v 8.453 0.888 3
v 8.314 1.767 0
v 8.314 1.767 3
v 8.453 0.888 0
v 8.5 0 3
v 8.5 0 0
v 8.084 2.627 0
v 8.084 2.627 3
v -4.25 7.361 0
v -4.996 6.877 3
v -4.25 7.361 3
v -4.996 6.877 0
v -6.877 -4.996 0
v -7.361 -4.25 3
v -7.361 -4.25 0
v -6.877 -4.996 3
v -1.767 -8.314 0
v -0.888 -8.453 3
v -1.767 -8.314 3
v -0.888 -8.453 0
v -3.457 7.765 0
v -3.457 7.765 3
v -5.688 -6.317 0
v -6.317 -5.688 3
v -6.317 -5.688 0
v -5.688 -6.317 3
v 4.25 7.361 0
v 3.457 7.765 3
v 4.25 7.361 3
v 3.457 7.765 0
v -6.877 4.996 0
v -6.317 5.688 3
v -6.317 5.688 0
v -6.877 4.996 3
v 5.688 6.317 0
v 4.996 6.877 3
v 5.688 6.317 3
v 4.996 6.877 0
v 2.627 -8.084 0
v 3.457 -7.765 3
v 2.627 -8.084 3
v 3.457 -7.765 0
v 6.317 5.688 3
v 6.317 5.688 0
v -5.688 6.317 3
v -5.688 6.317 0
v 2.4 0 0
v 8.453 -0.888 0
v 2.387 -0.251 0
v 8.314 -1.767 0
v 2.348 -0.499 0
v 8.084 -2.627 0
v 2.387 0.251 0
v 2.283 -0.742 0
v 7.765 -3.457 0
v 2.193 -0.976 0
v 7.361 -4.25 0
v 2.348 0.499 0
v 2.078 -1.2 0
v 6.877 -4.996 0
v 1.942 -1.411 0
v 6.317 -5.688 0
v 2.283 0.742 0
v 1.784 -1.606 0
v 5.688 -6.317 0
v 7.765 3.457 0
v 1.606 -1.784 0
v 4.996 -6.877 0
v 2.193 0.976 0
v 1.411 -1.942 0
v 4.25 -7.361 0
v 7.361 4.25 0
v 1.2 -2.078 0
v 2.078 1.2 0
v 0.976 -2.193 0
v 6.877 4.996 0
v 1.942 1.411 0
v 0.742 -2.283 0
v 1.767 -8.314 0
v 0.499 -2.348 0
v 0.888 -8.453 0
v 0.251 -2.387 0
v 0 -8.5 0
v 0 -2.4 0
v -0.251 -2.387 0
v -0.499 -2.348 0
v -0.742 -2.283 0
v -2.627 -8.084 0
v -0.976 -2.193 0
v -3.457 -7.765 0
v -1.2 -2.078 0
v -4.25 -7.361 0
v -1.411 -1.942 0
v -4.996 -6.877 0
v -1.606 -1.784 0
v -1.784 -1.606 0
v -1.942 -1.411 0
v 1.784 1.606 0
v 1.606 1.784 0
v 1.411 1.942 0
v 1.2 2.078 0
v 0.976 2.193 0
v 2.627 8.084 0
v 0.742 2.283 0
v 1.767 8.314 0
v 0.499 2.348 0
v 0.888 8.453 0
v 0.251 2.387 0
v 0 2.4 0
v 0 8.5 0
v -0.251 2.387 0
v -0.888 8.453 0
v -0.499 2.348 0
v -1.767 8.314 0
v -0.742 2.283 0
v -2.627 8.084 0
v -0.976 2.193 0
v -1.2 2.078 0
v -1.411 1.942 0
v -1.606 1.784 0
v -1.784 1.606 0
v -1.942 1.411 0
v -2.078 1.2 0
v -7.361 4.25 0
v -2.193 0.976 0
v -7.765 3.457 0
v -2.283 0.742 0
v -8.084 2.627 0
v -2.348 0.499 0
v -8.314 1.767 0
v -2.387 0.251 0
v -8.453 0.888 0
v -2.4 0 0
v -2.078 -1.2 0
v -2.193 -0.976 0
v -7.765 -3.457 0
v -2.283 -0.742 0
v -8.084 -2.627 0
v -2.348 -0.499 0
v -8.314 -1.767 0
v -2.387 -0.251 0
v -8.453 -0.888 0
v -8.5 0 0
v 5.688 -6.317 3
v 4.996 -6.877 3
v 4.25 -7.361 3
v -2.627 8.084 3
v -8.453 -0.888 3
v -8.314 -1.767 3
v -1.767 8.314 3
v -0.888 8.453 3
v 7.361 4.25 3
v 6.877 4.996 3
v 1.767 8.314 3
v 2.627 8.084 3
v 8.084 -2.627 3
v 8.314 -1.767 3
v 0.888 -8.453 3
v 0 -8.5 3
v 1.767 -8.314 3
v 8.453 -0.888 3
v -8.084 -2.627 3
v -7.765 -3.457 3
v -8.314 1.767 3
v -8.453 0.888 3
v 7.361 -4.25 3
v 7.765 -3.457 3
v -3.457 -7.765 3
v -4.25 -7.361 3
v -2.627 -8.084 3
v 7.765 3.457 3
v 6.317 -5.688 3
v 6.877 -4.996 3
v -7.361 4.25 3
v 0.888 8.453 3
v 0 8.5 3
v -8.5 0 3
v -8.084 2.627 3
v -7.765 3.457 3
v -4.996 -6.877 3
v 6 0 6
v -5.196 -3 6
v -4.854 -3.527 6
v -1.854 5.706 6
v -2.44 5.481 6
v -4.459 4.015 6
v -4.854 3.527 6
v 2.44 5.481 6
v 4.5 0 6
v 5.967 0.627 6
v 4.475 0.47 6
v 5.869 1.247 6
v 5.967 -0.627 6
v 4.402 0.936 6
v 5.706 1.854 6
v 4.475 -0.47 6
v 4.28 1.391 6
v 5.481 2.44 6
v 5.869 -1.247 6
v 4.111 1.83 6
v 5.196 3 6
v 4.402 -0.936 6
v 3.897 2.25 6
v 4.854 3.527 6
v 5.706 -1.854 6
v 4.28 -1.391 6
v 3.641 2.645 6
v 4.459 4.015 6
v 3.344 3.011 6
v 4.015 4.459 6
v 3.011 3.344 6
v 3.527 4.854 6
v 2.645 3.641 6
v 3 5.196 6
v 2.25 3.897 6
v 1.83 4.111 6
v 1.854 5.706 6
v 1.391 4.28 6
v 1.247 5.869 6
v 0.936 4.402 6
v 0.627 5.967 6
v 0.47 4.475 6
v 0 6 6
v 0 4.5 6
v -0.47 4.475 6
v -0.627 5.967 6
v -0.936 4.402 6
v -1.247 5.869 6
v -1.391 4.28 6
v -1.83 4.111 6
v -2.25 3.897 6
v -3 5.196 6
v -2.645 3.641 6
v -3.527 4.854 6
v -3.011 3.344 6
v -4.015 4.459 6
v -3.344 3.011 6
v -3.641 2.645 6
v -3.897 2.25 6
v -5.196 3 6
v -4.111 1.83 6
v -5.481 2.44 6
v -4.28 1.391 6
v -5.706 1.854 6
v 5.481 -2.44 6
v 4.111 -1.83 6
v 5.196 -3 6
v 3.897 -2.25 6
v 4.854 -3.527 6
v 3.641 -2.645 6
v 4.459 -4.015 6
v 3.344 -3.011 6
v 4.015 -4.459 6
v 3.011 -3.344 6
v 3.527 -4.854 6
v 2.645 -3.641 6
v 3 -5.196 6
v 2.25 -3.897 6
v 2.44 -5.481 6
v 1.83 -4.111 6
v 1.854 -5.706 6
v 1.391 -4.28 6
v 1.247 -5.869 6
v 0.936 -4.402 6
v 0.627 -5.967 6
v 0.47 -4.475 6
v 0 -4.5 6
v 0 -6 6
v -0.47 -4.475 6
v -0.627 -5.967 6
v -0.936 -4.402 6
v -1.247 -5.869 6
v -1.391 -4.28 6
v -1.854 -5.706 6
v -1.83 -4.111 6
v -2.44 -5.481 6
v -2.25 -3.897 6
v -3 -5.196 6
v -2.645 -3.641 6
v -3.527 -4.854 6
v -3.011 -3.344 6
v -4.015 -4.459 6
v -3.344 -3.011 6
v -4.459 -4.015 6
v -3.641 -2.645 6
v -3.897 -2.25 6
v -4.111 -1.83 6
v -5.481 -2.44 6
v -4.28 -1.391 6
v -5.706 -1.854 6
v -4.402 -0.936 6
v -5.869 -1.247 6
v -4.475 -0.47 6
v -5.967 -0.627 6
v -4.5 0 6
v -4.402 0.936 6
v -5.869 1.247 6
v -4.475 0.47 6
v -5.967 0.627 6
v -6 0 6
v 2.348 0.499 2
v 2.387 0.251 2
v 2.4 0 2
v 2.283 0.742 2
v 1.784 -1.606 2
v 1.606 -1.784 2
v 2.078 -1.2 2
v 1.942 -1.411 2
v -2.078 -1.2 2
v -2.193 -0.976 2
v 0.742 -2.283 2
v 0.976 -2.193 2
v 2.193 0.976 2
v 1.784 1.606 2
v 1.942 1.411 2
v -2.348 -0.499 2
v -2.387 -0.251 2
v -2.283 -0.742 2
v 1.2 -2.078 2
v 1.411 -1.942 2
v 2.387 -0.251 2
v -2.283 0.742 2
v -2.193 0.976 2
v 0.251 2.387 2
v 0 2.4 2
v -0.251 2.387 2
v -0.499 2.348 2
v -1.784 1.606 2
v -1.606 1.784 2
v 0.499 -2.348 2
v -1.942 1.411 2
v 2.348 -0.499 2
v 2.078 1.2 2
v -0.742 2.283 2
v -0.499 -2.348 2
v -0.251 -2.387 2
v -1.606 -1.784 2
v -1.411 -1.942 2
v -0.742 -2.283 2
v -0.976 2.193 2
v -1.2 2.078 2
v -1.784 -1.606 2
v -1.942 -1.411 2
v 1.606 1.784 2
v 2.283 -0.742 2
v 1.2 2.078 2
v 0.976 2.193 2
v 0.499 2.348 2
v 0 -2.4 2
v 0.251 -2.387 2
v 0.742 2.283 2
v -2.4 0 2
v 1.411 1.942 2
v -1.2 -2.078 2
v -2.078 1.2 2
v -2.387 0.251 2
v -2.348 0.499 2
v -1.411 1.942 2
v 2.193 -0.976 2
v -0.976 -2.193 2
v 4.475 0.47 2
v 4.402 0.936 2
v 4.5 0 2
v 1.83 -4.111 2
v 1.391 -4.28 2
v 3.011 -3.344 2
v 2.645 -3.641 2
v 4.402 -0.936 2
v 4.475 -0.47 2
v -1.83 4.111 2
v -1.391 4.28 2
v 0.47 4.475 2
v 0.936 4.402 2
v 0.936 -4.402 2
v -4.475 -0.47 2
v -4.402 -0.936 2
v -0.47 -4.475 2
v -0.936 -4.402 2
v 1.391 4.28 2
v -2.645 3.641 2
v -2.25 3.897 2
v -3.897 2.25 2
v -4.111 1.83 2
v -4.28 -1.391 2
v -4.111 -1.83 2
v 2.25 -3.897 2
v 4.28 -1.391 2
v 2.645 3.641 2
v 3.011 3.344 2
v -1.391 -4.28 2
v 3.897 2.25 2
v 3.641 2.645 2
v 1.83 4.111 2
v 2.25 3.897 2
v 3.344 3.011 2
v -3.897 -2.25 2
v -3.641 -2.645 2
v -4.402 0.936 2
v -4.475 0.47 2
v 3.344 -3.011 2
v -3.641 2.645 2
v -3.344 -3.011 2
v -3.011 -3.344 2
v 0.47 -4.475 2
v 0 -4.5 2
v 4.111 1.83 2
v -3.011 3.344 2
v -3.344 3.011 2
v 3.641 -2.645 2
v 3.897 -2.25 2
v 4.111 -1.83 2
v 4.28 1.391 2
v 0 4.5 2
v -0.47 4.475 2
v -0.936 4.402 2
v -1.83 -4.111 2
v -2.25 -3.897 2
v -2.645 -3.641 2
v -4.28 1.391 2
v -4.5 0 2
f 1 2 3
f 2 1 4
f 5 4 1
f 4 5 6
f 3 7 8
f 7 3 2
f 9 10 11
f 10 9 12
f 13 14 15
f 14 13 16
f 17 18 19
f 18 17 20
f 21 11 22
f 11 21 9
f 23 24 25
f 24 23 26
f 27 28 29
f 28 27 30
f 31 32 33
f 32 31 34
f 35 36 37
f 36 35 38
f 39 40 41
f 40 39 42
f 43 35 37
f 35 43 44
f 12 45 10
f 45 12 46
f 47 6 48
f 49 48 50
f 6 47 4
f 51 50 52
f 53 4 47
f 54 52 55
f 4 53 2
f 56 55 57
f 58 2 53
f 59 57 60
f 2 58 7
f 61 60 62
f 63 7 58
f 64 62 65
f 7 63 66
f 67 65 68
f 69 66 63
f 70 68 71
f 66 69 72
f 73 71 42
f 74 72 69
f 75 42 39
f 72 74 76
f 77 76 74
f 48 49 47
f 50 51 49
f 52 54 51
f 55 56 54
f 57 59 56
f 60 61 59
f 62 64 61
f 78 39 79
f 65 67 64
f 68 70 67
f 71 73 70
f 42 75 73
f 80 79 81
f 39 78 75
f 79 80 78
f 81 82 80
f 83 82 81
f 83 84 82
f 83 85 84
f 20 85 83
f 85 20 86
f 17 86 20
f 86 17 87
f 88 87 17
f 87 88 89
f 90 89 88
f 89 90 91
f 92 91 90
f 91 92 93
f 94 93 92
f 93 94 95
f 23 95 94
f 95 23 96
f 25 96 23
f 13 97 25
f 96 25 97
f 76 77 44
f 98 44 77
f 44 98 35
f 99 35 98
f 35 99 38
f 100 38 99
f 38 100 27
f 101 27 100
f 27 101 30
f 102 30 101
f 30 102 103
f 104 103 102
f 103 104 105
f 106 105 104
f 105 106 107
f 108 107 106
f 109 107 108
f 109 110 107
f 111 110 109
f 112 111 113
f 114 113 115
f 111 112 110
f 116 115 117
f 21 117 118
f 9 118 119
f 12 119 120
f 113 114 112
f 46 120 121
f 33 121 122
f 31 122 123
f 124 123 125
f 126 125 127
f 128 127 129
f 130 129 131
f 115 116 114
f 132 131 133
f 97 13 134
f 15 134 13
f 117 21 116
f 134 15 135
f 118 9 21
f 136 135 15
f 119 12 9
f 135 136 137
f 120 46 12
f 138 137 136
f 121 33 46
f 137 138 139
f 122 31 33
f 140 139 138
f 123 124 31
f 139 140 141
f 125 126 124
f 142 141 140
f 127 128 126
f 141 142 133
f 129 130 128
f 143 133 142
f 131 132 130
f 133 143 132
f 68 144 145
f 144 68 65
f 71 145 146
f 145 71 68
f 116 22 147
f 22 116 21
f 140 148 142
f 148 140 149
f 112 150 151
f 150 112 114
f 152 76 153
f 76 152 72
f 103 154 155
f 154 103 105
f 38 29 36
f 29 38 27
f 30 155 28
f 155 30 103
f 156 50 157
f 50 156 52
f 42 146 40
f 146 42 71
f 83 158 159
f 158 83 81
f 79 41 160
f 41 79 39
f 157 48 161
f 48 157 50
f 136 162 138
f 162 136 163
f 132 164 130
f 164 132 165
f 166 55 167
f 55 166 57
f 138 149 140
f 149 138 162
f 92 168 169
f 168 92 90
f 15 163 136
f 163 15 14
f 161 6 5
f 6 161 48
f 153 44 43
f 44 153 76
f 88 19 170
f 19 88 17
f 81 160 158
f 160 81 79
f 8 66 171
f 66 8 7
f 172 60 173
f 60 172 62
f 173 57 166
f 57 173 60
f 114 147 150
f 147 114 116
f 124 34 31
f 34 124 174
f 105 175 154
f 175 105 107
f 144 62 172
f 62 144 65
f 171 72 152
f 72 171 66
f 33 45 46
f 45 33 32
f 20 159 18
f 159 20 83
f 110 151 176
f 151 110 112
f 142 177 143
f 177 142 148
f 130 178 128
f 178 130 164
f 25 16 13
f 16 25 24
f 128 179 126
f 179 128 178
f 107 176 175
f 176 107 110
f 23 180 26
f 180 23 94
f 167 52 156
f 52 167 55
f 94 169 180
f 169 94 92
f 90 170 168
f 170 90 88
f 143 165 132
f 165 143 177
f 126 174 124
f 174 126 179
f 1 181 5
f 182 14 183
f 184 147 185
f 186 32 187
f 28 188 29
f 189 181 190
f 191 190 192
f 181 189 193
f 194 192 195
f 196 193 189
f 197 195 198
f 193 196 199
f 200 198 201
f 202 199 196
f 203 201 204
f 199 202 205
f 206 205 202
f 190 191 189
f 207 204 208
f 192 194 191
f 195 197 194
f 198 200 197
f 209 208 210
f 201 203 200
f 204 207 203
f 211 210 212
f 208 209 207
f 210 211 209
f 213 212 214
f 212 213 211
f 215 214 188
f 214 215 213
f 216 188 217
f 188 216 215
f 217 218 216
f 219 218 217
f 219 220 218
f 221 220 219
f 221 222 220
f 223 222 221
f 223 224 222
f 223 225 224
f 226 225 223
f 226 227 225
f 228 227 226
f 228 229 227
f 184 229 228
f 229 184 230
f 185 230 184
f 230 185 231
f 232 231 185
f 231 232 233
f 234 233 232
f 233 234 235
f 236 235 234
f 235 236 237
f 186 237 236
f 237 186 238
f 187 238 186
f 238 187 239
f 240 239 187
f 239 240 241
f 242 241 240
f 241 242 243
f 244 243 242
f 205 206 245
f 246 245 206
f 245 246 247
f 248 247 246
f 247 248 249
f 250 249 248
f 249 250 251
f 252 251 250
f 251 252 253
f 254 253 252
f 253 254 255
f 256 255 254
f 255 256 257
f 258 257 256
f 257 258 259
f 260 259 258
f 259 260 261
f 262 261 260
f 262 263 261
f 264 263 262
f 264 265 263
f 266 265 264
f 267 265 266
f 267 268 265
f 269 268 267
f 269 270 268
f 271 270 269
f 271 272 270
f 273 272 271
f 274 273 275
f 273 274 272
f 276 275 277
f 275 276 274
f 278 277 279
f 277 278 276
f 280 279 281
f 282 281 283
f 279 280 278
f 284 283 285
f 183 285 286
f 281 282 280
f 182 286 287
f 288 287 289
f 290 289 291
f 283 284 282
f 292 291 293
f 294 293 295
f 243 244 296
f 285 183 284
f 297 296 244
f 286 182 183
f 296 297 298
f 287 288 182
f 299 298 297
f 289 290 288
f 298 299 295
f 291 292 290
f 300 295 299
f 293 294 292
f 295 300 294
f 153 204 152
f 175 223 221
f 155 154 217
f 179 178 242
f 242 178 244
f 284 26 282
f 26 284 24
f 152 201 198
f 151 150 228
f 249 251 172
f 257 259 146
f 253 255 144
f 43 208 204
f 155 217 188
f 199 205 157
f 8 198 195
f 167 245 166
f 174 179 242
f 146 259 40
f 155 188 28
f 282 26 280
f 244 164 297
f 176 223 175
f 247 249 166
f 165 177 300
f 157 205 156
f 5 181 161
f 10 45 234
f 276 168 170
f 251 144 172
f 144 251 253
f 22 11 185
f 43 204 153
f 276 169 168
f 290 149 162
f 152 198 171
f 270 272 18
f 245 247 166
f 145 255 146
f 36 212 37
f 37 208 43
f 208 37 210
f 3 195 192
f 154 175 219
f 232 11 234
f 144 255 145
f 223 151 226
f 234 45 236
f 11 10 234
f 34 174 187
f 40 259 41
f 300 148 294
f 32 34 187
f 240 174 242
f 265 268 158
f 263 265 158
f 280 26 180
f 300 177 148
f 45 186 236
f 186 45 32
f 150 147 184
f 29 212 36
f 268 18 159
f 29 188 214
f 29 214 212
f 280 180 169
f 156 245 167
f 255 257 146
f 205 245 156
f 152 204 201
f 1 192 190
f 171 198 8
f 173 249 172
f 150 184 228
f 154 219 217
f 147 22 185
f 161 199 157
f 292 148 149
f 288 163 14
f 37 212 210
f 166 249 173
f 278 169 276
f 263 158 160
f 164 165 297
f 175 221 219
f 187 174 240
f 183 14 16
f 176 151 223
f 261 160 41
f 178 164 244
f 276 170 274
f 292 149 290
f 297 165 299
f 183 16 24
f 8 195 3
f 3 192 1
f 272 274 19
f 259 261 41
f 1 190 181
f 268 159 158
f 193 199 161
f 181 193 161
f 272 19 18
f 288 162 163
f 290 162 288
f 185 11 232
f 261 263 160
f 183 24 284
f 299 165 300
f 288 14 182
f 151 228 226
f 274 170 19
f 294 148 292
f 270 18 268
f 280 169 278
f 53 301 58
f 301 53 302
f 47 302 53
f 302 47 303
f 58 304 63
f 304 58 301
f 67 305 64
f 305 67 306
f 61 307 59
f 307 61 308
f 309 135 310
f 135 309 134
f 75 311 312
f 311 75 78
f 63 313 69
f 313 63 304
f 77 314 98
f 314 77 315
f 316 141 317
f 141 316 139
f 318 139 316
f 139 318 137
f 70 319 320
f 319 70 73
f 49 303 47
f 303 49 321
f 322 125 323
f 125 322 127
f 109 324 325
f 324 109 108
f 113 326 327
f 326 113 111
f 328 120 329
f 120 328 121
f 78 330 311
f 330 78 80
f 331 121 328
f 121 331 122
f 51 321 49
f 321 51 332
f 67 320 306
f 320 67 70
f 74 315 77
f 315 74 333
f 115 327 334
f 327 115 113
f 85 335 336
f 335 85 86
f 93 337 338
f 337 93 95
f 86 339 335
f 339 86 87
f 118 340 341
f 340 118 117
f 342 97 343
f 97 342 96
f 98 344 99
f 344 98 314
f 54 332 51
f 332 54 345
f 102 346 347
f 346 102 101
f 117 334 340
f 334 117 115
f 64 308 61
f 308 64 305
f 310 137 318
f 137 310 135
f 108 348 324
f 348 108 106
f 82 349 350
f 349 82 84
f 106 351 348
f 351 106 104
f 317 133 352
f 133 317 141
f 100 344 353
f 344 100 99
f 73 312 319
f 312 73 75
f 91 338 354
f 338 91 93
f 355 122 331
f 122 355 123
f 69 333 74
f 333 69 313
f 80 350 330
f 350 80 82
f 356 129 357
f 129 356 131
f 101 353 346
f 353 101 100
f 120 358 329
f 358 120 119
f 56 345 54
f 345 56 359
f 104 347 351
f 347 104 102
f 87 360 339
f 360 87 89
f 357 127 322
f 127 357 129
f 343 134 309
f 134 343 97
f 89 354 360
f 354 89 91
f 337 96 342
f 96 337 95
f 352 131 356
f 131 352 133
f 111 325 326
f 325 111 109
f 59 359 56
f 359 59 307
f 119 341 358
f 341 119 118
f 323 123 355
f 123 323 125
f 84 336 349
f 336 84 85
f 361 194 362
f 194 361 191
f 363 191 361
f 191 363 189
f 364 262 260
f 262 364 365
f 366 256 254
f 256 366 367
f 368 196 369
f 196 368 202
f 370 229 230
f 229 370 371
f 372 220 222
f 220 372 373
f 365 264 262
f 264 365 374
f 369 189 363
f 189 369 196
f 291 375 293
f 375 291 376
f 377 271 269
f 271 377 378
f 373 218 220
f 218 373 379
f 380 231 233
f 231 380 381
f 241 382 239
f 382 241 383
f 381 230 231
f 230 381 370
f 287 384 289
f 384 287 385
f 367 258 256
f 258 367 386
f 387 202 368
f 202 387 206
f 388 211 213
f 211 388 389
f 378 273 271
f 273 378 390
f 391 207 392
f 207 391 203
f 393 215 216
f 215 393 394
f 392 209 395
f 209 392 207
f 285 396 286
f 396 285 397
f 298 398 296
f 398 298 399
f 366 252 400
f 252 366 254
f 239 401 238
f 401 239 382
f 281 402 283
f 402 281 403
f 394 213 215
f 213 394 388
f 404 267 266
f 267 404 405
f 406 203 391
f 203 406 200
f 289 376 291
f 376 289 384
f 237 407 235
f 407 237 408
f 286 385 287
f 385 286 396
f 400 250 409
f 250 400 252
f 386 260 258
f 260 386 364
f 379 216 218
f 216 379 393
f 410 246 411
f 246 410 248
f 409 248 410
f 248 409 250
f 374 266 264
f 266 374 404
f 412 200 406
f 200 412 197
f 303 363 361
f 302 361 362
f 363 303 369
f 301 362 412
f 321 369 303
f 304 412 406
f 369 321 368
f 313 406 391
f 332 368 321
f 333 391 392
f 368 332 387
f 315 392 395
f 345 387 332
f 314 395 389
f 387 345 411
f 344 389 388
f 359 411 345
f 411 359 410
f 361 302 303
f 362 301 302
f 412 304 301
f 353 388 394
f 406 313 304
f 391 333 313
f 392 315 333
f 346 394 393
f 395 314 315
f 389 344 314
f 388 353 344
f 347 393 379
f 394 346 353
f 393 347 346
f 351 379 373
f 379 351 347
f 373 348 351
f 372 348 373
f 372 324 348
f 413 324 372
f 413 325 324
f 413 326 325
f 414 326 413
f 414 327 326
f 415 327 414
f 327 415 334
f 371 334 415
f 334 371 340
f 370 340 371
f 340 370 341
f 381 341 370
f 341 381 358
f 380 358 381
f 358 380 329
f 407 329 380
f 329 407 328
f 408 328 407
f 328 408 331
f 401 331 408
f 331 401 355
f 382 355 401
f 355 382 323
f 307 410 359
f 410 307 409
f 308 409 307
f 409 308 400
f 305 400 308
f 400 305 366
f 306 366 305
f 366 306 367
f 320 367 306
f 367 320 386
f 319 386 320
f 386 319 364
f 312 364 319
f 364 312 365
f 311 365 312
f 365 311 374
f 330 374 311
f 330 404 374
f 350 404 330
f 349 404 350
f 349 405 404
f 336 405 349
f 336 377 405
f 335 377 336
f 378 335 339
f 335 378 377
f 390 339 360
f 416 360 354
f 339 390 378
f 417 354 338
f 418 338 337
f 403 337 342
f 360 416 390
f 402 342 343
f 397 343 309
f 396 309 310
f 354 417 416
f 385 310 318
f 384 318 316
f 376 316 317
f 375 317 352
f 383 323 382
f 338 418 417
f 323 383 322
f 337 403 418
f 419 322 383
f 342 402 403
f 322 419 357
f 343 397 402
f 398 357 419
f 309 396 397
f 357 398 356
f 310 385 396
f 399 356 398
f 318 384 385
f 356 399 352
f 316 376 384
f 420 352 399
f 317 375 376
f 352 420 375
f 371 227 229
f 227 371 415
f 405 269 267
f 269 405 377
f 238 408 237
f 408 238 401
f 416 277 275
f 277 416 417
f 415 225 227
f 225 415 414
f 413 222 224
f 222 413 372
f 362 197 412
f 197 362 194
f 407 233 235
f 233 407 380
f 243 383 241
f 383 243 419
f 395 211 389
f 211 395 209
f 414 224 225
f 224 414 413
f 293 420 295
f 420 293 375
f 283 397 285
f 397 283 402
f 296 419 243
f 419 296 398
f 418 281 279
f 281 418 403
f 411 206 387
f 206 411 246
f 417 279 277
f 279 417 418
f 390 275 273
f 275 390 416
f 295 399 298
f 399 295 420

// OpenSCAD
boltD = 4.8;
boltheadD= 9;
boltarea=3;
width=17;

difference(){
    union(){
        cylinder(d=width, h=boltarea, $fn=60);
        translate([0,0,boltarea]) cylinder(d1=width,d2=width-5,h=boltarea,$fn=60);
    }
    cylinder(d=boltD, h=boltarea, $fn=60);
    translate([0,0,boltarea-1]) cylinder(d=boltheadD,h=boltarea+1,$fn=60); 
}
